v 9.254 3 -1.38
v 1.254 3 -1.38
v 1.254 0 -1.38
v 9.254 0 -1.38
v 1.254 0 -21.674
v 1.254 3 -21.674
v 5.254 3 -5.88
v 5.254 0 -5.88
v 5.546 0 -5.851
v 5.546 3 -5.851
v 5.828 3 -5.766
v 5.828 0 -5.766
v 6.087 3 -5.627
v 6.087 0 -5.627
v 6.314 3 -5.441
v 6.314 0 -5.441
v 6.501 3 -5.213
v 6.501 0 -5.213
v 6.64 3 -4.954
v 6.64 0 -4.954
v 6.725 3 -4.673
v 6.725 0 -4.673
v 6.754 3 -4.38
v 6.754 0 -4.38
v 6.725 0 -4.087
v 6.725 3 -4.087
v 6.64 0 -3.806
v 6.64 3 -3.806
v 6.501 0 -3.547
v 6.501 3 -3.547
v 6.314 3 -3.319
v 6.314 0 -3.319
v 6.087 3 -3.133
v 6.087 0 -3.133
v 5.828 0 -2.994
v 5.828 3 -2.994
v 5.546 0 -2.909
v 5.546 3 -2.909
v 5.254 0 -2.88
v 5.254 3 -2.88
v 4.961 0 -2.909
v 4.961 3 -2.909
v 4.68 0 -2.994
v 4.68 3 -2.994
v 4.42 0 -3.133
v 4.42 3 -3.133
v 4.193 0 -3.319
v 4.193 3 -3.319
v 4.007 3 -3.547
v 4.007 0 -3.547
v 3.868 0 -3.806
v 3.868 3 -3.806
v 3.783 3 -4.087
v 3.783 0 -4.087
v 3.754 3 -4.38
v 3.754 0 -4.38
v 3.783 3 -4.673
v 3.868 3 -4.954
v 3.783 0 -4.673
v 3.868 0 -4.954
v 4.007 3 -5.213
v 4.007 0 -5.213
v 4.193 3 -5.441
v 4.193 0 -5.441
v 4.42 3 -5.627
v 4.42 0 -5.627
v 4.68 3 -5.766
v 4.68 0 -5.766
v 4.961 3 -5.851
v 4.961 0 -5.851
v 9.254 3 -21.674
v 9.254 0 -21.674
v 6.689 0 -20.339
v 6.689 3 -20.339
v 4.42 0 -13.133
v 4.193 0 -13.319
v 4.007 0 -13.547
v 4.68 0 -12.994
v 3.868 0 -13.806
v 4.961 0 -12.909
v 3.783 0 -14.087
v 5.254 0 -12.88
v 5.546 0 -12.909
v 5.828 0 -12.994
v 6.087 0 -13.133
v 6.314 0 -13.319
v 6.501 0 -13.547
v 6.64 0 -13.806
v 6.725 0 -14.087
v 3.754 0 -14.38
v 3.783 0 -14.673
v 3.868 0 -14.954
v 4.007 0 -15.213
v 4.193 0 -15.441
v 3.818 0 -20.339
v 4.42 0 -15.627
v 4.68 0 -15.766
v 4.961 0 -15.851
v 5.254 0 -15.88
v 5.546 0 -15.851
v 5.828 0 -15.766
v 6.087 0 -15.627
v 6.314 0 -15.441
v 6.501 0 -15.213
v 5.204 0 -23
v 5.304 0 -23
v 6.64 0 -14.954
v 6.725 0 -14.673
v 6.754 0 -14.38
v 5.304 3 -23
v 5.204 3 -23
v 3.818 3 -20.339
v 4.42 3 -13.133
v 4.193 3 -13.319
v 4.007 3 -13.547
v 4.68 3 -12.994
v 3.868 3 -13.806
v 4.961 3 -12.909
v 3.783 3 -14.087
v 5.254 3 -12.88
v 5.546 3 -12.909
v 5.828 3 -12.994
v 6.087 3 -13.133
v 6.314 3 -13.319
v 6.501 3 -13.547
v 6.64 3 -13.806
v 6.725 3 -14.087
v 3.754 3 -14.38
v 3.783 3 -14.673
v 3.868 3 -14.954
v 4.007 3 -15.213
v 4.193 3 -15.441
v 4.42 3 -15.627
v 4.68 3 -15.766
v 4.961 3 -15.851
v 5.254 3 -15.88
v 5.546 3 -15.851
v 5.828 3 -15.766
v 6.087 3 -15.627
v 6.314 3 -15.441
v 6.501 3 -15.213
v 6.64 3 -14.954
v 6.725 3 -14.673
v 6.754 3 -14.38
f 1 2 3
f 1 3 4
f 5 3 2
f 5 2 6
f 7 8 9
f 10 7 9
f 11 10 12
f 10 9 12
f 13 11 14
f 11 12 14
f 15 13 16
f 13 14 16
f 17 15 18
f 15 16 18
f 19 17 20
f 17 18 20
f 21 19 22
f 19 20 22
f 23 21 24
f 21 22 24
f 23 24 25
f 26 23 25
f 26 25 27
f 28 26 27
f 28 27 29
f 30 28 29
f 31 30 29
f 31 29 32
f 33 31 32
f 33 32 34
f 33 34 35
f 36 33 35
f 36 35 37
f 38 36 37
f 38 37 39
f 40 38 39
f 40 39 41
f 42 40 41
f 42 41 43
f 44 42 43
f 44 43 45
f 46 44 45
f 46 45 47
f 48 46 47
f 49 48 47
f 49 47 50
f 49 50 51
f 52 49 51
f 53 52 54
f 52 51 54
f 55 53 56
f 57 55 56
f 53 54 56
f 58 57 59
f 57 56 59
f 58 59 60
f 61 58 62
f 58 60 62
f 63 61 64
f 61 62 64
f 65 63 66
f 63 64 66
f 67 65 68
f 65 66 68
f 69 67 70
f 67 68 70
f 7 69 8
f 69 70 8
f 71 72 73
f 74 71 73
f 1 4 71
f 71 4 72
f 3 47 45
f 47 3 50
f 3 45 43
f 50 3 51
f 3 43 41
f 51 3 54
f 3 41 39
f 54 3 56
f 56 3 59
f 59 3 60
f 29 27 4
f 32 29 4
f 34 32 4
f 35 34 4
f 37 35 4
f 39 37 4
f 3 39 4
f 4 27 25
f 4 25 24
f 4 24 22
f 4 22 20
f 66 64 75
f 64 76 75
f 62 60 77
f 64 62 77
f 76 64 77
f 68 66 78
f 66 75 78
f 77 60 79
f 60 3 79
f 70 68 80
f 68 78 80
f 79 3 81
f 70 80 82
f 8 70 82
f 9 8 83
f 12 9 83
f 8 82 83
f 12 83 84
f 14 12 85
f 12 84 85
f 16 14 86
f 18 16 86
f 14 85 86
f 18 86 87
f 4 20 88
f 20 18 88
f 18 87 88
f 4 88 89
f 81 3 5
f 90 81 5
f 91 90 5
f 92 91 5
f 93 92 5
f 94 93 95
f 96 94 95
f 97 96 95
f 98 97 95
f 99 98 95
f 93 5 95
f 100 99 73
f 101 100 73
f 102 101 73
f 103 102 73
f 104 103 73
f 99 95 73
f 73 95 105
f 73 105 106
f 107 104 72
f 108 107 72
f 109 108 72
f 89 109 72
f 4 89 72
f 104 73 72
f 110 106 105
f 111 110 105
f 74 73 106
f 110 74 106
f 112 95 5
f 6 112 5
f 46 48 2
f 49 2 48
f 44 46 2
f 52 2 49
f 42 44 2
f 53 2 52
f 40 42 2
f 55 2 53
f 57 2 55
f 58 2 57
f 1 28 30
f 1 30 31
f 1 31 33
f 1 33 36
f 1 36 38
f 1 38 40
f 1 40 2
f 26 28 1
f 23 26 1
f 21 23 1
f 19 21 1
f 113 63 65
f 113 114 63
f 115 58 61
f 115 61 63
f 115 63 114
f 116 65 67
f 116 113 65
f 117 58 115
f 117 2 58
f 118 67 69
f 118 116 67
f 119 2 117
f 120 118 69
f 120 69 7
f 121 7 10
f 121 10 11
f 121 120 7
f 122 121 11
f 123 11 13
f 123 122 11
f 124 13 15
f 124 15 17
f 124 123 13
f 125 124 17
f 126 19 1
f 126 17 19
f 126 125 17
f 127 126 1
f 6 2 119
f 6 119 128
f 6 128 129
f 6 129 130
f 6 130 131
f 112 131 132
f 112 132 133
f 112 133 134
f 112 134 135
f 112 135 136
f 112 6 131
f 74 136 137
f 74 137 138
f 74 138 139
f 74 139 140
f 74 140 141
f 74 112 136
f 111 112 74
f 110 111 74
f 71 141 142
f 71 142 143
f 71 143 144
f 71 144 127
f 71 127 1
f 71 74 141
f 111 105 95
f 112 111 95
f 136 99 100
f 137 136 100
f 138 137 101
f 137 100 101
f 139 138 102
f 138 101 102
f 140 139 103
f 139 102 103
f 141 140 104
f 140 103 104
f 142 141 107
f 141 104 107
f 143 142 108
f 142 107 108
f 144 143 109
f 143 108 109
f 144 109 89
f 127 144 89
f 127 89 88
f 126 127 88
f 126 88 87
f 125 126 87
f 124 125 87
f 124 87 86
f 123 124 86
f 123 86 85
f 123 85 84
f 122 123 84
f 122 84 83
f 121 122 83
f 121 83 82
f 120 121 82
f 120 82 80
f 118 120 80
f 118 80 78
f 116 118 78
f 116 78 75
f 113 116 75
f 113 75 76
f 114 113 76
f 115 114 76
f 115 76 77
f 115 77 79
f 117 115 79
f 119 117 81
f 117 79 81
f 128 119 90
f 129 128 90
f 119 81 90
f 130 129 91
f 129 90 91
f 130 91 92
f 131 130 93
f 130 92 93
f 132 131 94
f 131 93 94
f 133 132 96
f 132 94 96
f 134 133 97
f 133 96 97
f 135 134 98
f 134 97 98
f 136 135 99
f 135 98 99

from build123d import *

# Parameters (mm, degrees)
BOSS_EXTRUDE3_DEPTH      = 3
M3_CLEARANCE_HOLE1_D     = 3
M3_CLEARANCE_HOLE1_DEPTH = 10
M3_CLEARANCE_HOLE1_TIP   = 0.901290929
SKETCH5_W                = 0.5
SKETCH5_H                = 21.724414851
CUT_EXTRUDE1_DEPTH       = 10
SKETCH6_W                = 8
SKETCH6_H                = 3
CUT_EXTRUDE2_DEPTH       = 1.38


with BuildPart() as part:
    # Sketch1 → Boss-Extrude3 (new body)
    with BuildSketch(Plane(origin=(0, 0, 0), x_dir=(1, 0, 0), z_dir=(0, 1, 0))):
        Polygon((5.303721661, 23.00020151), (5.253721661, 23.00020151), (5.253721661, 0), (9.753721661, 0), (9.753721661, 21.724414851), (9.35, 21.724414851), (6.6889675, 20.339169011), align=None)
        Polygon((3.818475821, 20.339169011), (1.157443322, 21.724414851), (0.753721661, 21.724414851), (0.753721661, 0), (5.253721661, 0), (5.253721661, 23.00020151), (5.203721661, 23.00020151), align=None)
    extrude(amount=BOSS_EXTRUDE3_DEPTH)

    # M3 Clearance Hole1
    with Locations(Plane(origin=(5.253721661, 3, -14.38), x_dir=(0, 0, 1), z_dir=(0, 1, 0))):
        with Locations((0, 0), (10, 0)):
            Hole(M3_CLEARANCE_HOLE1_D / 2, depth=M3_CLEARANCE_HOLE1_DEPTH)
            with Locations((0, 0, -(M3_CLEARANCE_HOLE1_DEPTH + M3_CLEARANCE_HOLE1_TIP / 2))):  # 118° drill point
                Cone(0, M3_CLEARANCE_HOLE1_D / 2, M3_CLEARANCE_HOLE1_TIP, mode=Mode.SUBTRACT)

    # Sketch5 → Cut-Extrude1 (cut)
    with BuildSketch(Plane(origin=(0, 0, 0), x_dir=(-1, 0, 0), z_dir=(0, -1, 0))):
        with Locations((-1.003721661, 10.862207426)):
            Rectangle(SKETCH5_W, SKETCH5_H)
        with Locations((-9.503721661, 10.862207426)):
            Rectangle(SKETCH5_W, SKETCH5_H)
    extrude(amount=-CUT_EXTRUDE1_DEPTH, mode=Mode.SUBTRACT)

    # Sketch6 → Cut-Extrude2 (cut)
    with BuildSketch(Plane.XY):
        with Locations((5.253721661, 1.5)):
            Rectangle(SKETCH6_W, SKETCH6_H)
    extrude(amount=-CUT_EXTRUDE2_DEPTH, mode=Mode.SUBTRACT)


solid = part.part
